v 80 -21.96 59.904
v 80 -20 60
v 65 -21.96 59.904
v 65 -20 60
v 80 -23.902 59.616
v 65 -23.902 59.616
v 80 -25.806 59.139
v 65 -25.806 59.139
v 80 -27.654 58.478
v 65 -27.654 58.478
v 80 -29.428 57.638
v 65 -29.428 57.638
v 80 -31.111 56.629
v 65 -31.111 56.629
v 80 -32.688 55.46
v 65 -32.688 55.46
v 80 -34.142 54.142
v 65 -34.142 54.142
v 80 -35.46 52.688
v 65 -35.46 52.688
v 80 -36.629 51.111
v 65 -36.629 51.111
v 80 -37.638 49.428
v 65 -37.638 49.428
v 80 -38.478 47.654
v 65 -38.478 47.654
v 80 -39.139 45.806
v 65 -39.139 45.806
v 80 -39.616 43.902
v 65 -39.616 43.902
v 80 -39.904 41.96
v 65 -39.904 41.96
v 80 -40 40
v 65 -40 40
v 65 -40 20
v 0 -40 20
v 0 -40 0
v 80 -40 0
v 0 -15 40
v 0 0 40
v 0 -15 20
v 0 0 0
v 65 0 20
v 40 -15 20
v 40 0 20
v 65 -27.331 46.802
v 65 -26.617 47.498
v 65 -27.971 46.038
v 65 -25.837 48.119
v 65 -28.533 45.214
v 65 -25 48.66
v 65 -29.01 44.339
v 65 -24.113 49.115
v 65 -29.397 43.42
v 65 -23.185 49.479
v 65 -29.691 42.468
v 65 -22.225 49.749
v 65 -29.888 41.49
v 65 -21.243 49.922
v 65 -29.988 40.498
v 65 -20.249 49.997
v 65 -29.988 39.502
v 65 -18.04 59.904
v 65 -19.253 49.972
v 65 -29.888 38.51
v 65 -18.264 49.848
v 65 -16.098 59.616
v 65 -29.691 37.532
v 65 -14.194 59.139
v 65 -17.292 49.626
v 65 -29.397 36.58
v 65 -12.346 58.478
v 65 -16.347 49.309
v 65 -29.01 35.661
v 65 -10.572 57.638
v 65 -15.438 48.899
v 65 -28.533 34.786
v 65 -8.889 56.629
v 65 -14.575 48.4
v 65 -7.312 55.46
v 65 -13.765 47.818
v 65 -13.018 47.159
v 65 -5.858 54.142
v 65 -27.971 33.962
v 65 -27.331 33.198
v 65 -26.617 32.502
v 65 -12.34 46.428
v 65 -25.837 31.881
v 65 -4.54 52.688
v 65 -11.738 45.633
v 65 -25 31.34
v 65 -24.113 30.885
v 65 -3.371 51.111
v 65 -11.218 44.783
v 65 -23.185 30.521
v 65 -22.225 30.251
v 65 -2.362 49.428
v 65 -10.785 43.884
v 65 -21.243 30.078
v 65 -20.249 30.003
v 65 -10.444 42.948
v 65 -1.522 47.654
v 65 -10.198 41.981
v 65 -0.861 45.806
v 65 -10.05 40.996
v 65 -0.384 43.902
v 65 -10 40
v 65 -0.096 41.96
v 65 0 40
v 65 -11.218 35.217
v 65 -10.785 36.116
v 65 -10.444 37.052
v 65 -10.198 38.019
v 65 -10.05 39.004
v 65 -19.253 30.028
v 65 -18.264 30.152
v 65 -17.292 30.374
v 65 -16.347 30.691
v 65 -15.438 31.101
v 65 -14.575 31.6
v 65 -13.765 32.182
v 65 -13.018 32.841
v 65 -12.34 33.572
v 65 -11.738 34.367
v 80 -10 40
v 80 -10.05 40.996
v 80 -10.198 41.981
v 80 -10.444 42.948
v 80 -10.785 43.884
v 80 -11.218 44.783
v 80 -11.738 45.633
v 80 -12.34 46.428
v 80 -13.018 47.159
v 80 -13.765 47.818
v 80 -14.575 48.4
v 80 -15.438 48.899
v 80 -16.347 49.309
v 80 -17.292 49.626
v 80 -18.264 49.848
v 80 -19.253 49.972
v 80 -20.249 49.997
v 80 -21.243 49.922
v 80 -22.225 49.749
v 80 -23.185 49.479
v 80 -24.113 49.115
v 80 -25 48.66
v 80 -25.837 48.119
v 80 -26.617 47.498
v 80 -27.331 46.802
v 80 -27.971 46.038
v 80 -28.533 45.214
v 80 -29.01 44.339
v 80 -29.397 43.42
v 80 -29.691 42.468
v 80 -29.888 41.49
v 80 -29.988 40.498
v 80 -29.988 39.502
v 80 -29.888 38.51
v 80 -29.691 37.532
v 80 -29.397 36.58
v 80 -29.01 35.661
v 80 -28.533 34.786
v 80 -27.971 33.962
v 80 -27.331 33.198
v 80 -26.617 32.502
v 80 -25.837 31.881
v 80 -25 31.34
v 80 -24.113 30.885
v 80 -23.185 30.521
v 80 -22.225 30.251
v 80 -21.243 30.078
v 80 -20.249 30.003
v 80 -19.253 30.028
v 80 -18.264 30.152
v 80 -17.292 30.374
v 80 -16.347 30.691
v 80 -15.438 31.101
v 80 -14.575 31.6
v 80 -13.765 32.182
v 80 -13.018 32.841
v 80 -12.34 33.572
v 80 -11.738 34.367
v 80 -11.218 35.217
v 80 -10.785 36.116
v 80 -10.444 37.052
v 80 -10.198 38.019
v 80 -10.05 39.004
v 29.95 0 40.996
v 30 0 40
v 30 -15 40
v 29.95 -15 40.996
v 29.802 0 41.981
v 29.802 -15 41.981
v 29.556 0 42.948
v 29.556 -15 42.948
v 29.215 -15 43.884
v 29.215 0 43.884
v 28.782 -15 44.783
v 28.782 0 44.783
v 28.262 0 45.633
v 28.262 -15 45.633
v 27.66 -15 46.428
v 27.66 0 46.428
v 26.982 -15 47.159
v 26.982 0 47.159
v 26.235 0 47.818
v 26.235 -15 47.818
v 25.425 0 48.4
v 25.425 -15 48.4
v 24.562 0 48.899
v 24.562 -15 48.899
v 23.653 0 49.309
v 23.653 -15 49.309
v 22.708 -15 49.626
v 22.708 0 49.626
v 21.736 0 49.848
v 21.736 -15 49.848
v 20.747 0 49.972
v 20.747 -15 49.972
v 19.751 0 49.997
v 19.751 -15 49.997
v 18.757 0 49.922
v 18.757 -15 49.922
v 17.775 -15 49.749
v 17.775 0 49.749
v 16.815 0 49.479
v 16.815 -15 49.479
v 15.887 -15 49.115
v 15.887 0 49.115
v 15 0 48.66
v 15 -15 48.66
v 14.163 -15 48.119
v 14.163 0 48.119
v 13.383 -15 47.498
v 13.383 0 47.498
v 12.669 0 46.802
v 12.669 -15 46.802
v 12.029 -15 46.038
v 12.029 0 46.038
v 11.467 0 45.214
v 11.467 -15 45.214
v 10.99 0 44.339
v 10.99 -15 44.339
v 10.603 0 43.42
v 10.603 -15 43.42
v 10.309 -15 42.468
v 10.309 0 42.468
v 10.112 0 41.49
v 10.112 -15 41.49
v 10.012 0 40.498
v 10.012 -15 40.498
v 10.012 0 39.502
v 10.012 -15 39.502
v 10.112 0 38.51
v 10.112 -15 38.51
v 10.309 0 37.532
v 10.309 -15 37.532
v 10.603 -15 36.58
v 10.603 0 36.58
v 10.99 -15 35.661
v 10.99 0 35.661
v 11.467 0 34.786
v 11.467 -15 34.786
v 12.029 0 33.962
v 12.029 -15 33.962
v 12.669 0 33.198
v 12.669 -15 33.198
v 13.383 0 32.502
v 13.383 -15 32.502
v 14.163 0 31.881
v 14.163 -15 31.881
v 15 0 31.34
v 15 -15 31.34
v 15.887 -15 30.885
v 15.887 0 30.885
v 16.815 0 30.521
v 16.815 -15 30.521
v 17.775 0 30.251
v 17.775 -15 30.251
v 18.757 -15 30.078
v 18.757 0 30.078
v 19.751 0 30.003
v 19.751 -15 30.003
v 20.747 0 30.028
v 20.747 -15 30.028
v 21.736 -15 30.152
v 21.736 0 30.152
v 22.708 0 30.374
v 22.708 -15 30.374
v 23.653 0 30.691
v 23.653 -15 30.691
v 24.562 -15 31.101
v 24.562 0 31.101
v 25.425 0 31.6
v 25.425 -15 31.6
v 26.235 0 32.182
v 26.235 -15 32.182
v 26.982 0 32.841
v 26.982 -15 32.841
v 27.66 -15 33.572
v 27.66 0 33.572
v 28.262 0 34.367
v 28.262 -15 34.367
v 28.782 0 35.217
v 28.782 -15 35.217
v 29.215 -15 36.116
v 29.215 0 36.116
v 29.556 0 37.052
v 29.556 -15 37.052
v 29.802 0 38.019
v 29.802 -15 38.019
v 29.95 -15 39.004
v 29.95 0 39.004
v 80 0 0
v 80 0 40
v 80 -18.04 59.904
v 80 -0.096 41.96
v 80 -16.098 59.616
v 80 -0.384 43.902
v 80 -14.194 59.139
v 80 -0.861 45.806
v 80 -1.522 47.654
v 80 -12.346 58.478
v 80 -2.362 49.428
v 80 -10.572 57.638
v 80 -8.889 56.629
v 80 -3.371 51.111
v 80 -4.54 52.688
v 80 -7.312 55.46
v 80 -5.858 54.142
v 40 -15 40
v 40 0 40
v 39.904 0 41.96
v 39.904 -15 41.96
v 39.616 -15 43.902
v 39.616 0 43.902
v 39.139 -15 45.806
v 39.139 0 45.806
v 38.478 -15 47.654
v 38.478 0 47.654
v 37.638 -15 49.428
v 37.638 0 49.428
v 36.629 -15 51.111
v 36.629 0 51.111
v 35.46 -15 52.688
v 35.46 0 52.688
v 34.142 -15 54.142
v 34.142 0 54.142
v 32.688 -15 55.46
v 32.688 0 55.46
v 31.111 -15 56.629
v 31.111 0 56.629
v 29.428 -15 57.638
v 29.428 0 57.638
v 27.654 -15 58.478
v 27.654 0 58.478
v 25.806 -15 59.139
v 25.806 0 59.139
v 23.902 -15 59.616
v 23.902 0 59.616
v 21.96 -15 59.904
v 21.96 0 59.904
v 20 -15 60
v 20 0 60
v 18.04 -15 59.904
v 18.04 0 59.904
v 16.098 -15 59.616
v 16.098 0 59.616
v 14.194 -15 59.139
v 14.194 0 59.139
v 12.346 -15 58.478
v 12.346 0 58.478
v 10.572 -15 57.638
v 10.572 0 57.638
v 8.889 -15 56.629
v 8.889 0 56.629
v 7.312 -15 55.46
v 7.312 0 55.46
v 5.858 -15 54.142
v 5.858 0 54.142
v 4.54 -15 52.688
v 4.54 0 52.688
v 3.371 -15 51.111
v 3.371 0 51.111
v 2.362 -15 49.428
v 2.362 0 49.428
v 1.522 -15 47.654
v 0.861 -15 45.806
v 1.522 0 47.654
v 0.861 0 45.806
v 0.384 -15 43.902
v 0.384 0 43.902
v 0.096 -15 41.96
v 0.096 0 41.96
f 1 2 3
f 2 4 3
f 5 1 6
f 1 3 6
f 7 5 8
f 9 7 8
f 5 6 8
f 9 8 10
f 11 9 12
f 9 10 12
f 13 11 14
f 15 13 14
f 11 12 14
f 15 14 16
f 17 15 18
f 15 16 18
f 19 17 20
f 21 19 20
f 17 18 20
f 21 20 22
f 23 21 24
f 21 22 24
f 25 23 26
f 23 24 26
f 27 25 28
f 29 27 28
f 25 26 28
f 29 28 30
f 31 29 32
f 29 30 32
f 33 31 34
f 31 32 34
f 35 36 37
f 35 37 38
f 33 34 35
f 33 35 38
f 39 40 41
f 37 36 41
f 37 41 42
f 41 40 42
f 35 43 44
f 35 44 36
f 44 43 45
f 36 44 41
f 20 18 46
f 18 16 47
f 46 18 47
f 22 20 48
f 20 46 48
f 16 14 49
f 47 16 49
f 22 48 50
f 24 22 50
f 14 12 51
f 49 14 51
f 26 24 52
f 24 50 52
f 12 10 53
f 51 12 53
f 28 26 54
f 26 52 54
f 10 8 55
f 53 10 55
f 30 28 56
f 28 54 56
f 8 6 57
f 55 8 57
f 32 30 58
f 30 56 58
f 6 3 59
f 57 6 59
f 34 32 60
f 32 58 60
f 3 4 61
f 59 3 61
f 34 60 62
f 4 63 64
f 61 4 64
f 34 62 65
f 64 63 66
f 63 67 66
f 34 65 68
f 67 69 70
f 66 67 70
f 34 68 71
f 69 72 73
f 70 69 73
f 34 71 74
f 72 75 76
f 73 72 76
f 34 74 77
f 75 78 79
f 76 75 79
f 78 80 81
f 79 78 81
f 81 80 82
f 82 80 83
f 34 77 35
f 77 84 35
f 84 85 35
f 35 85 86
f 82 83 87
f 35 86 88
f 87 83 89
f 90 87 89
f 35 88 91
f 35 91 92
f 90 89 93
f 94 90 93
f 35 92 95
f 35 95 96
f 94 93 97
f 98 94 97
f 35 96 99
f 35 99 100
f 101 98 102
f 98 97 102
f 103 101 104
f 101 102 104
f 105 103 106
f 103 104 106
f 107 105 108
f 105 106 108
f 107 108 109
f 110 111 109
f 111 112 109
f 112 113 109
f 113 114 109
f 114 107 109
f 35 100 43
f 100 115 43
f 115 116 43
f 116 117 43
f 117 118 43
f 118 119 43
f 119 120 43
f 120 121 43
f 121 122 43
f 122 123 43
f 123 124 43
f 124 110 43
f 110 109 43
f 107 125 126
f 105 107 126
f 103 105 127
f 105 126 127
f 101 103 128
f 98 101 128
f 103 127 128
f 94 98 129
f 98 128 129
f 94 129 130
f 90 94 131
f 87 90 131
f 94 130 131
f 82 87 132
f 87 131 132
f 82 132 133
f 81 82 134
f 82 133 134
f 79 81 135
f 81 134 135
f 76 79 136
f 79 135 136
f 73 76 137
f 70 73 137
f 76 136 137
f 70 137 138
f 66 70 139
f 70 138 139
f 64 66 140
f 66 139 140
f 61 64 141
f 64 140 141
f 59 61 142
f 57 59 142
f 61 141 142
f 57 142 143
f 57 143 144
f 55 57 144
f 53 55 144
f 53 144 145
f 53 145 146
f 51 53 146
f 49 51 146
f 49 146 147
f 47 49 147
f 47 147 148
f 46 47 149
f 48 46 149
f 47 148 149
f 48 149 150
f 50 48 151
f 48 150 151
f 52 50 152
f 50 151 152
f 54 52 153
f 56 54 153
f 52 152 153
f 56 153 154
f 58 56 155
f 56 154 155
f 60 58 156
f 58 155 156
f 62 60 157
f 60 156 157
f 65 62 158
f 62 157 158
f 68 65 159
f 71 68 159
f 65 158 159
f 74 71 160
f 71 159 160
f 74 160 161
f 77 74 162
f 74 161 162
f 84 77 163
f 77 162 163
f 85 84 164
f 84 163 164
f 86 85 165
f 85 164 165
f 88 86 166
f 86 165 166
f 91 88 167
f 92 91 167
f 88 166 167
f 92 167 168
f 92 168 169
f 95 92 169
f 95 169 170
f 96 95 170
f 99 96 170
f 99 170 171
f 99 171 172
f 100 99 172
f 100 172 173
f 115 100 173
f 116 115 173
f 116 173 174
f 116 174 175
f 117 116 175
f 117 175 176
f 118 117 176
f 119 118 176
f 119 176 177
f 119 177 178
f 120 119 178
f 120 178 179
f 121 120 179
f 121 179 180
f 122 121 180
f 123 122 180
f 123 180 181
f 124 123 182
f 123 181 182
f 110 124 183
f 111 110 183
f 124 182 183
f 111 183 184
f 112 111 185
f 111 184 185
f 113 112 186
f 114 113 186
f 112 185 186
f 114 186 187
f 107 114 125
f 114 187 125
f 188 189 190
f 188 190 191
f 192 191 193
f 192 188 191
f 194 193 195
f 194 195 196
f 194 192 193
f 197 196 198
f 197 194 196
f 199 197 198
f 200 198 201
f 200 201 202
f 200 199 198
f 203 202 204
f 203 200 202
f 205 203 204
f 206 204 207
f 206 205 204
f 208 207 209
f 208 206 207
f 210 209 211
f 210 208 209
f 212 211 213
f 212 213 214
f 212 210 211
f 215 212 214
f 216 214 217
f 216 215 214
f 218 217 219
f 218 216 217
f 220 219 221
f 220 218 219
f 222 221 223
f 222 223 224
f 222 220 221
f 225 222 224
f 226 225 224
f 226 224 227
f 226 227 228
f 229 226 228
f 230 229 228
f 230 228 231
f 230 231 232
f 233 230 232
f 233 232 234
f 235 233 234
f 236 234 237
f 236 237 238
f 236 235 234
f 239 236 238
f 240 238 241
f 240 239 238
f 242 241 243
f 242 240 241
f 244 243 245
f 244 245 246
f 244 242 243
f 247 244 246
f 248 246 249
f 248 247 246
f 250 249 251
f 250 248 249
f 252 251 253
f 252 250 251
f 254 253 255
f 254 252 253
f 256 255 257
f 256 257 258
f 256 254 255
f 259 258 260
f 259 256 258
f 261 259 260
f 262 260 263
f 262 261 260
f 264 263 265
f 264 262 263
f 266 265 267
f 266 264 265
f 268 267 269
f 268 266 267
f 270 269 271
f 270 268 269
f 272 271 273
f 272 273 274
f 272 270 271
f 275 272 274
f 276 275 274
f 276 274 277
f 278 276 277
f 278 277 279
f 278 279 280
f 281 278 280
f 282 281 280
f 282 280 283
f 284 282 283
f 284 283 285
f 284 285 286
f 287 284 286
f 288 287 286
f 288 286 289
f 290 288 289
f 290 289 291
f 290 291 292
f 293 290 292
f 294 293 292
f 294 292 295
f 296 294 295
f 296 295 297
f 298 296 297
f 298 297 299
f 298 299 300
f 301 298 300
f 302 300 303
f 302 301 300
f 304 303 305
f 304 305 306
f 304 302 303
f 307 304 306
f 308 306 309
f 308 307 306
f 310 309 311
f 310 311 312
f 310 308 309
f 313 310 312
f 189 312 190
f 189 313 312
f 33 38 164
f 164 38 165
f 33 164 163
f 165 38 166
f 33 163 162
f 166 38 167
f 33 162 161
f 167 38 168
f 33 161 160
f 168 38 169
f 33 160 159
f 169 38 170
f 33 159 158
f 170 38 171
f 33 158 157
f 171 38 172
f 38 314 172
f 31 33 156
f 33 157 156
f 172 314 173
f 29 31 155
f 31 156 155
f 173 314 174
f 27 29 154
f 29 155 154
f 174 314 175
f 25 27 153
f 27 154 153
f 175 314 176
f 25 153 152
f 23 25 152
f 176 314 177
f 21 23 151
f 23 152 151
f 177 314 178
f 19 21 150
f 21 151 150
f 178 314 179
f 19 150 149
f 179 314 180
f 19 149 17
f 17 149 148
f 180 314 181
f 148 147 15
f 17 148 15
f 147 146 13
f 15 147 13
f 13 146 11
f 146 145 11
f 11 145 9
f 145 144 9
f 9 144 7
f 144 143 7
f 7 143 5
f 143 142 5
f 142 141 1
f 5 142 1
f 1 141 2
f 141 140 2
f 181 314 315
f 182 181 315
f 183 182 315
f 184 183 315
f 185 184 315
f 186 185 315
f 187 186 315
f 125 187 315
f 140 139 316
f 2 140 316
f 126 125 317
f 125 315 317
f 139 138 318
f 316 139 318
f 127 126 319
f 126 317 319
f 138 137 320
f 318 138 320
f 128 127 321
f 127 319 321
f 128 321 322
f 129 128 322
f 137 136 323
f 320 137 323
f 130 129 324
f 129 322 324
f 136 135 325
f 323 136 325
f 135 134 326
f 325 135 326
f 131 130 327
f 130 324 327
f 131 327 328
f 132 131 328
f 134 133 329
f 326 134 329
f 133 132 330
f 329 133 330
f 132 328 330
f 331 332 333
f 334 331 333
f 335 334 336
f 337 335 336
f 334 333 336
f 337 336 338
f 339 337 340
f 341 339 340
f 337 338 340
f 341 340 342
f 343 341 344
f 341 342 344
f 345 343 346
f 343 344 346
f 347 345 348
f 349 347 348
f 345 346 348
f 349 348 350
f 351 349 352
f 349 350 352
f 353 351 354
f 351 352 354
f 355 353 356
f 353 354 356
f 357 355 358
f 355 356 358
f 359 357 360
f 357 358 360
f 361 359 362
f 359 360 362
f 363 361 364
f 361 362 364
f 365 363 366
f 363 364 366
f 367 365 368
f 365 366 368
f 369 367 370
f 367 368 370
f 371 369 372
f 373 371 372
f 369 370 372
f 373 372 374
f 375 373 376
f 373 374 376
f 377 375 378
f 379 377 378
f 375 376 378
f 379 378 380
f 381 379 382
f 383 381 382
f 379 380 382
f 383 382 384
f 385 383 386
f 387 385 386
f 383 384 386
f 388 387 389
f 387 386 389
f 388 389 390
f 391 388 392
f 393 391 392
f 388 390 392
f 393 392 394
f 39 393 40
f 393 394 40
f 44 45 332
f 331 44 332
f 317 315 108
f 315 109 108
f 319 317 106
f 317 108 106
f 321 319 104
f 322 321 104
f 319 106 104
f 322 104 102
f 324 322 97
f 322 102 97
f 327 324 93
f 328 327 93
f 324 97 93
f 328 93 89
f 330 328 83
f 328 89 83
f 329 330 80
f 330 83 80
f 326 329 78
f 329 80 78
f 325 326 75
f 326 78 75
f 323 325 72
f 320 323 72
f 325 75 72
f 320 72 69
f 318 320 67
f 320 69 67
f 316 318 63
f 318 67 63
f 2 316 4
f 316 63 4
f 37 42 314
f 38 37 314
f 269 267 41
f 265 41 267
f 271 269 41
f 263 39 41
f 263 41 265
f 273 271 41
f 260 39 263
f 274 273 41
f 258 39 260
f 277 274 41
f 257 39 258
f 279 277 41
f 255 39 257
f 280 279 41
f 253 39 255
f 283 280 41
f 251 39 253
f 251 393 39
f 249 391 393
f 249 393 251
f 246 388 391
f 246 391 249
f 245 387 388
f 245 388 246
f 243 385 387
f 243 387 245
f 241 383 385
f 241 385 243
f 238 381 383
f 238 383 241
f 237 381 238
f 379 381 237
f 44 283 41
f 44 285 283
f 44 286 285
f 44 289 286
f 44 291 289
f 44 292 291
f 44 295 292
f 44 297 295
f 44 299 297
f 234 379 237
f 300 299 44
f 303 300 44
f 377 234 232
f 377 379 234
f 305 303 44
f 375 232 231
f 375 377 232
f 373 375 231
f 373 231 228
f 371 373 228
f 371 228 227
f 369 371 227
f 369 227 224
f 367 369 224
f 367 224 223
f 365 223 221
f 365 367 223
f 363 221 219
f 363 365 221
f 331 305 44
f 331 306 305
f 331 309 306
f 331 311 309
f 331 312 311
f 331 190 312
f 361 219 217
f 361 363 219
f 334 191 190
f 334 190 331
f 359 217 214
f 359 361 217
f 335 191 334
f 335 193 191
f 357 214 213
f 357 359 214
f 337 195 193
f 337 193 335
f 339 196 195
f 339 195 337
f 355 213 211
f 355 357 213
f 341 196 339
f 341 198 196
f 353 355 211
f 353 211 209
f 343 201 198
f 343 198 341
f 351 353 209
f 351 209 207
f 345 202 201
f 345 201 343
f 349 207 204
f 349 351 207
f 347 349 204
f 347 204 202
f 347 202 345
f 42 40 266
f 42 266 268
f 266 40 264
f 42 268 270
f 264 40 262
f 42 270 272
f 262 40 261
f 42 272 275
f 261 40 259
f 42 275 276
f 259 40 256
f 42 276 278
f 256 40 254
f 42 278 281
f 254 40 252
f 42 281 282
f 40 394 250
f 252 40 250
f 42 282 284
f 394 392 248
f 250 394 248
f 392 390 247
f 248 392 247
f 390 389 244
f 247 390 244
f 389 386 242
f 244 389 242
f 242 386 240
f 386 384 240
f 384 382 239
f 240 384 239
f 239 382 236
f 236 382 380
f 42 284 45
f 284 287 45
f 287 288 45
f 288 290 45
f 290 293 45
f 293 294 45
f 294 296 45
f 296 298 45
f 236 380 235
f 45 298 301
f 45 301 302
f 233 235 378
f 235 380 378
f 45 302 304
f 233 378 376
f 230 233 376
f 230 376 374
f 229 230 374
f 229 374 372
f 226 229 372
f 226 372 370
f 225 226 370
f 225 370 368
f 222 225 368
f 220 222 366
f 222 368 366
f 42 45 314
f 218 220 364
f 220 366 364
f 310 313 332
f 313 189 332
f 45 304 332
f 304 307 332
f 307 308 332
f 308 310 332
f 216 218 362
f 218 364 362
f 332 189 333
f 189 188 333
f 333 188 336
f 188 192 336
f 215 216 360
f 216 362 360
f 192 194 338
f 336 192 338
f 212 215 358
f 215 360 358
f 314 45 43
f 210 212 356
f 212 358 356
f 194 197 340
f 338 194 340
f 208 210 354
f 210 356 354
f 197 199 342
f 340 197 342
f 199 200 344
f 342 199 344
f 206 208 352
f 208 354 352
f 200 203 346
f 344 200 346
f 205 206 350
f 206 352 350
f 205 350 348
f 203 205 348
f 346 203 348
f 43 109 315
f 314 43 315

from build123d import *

# Parameters (mm, degrees)
F1_DEPTH = 40
F0_R     = 10
F2_DEPTH = 15
F4_R     = 19.99999
F5_R     = 10
F6_DEPTH = 15


# Not quite as in the source:
# - a fillet or chamfer is up to 0.001 mm smaller than in the source, because OpenCascade refuses the exact size


with BuildPart() as f1:
    # F0 (on Front) → F1 (new body)
    with BuildSketch(Plane.XZ):
        Polygon((0, 20), (0, 0), (80, 0), (80, 60), (65, 60), (65, 20), (40, 20), align=None)
    extrude(amount=F1_DEPTH)

    # F0 (on Front) → F2 (join)
    with BuildSketch(Plane.XZ):
        with BuildLine():
            Line((0, 40), (0, 20))
            Line((0, 20), (40, 20))
            Line((40, 20), (40, 40))
            ThreePointArc((40, 40), (20, 60), (0, 40))
        make_face()
        with Locations((20, 40)):
            Circle(F0_R, mode=Mode.SUBTRACT)
    extrude(amount=F2_DEPTH)

    # F4 (radius 20 in the source; OpenCascade refuses exactly that, so slightly less here)
    f4_edges = [f1.edges().sort_by_distance(p)[0] for p in [
        (72.5, -40, 60),
        (72.5, 0, 60),
    ]]
    fillet(f4_edges, radius=F4_R)

    # F5 (on face) → F6 (cut, through all)
    with BuildSketch(Plane.YZ.offset(80)):
        with Locations((-20, 40)):
            Circle(F5_R)
    extrude(amount=-F6_DEPTH, mode=Mode.SUBTRACT)


solid = f1.part
